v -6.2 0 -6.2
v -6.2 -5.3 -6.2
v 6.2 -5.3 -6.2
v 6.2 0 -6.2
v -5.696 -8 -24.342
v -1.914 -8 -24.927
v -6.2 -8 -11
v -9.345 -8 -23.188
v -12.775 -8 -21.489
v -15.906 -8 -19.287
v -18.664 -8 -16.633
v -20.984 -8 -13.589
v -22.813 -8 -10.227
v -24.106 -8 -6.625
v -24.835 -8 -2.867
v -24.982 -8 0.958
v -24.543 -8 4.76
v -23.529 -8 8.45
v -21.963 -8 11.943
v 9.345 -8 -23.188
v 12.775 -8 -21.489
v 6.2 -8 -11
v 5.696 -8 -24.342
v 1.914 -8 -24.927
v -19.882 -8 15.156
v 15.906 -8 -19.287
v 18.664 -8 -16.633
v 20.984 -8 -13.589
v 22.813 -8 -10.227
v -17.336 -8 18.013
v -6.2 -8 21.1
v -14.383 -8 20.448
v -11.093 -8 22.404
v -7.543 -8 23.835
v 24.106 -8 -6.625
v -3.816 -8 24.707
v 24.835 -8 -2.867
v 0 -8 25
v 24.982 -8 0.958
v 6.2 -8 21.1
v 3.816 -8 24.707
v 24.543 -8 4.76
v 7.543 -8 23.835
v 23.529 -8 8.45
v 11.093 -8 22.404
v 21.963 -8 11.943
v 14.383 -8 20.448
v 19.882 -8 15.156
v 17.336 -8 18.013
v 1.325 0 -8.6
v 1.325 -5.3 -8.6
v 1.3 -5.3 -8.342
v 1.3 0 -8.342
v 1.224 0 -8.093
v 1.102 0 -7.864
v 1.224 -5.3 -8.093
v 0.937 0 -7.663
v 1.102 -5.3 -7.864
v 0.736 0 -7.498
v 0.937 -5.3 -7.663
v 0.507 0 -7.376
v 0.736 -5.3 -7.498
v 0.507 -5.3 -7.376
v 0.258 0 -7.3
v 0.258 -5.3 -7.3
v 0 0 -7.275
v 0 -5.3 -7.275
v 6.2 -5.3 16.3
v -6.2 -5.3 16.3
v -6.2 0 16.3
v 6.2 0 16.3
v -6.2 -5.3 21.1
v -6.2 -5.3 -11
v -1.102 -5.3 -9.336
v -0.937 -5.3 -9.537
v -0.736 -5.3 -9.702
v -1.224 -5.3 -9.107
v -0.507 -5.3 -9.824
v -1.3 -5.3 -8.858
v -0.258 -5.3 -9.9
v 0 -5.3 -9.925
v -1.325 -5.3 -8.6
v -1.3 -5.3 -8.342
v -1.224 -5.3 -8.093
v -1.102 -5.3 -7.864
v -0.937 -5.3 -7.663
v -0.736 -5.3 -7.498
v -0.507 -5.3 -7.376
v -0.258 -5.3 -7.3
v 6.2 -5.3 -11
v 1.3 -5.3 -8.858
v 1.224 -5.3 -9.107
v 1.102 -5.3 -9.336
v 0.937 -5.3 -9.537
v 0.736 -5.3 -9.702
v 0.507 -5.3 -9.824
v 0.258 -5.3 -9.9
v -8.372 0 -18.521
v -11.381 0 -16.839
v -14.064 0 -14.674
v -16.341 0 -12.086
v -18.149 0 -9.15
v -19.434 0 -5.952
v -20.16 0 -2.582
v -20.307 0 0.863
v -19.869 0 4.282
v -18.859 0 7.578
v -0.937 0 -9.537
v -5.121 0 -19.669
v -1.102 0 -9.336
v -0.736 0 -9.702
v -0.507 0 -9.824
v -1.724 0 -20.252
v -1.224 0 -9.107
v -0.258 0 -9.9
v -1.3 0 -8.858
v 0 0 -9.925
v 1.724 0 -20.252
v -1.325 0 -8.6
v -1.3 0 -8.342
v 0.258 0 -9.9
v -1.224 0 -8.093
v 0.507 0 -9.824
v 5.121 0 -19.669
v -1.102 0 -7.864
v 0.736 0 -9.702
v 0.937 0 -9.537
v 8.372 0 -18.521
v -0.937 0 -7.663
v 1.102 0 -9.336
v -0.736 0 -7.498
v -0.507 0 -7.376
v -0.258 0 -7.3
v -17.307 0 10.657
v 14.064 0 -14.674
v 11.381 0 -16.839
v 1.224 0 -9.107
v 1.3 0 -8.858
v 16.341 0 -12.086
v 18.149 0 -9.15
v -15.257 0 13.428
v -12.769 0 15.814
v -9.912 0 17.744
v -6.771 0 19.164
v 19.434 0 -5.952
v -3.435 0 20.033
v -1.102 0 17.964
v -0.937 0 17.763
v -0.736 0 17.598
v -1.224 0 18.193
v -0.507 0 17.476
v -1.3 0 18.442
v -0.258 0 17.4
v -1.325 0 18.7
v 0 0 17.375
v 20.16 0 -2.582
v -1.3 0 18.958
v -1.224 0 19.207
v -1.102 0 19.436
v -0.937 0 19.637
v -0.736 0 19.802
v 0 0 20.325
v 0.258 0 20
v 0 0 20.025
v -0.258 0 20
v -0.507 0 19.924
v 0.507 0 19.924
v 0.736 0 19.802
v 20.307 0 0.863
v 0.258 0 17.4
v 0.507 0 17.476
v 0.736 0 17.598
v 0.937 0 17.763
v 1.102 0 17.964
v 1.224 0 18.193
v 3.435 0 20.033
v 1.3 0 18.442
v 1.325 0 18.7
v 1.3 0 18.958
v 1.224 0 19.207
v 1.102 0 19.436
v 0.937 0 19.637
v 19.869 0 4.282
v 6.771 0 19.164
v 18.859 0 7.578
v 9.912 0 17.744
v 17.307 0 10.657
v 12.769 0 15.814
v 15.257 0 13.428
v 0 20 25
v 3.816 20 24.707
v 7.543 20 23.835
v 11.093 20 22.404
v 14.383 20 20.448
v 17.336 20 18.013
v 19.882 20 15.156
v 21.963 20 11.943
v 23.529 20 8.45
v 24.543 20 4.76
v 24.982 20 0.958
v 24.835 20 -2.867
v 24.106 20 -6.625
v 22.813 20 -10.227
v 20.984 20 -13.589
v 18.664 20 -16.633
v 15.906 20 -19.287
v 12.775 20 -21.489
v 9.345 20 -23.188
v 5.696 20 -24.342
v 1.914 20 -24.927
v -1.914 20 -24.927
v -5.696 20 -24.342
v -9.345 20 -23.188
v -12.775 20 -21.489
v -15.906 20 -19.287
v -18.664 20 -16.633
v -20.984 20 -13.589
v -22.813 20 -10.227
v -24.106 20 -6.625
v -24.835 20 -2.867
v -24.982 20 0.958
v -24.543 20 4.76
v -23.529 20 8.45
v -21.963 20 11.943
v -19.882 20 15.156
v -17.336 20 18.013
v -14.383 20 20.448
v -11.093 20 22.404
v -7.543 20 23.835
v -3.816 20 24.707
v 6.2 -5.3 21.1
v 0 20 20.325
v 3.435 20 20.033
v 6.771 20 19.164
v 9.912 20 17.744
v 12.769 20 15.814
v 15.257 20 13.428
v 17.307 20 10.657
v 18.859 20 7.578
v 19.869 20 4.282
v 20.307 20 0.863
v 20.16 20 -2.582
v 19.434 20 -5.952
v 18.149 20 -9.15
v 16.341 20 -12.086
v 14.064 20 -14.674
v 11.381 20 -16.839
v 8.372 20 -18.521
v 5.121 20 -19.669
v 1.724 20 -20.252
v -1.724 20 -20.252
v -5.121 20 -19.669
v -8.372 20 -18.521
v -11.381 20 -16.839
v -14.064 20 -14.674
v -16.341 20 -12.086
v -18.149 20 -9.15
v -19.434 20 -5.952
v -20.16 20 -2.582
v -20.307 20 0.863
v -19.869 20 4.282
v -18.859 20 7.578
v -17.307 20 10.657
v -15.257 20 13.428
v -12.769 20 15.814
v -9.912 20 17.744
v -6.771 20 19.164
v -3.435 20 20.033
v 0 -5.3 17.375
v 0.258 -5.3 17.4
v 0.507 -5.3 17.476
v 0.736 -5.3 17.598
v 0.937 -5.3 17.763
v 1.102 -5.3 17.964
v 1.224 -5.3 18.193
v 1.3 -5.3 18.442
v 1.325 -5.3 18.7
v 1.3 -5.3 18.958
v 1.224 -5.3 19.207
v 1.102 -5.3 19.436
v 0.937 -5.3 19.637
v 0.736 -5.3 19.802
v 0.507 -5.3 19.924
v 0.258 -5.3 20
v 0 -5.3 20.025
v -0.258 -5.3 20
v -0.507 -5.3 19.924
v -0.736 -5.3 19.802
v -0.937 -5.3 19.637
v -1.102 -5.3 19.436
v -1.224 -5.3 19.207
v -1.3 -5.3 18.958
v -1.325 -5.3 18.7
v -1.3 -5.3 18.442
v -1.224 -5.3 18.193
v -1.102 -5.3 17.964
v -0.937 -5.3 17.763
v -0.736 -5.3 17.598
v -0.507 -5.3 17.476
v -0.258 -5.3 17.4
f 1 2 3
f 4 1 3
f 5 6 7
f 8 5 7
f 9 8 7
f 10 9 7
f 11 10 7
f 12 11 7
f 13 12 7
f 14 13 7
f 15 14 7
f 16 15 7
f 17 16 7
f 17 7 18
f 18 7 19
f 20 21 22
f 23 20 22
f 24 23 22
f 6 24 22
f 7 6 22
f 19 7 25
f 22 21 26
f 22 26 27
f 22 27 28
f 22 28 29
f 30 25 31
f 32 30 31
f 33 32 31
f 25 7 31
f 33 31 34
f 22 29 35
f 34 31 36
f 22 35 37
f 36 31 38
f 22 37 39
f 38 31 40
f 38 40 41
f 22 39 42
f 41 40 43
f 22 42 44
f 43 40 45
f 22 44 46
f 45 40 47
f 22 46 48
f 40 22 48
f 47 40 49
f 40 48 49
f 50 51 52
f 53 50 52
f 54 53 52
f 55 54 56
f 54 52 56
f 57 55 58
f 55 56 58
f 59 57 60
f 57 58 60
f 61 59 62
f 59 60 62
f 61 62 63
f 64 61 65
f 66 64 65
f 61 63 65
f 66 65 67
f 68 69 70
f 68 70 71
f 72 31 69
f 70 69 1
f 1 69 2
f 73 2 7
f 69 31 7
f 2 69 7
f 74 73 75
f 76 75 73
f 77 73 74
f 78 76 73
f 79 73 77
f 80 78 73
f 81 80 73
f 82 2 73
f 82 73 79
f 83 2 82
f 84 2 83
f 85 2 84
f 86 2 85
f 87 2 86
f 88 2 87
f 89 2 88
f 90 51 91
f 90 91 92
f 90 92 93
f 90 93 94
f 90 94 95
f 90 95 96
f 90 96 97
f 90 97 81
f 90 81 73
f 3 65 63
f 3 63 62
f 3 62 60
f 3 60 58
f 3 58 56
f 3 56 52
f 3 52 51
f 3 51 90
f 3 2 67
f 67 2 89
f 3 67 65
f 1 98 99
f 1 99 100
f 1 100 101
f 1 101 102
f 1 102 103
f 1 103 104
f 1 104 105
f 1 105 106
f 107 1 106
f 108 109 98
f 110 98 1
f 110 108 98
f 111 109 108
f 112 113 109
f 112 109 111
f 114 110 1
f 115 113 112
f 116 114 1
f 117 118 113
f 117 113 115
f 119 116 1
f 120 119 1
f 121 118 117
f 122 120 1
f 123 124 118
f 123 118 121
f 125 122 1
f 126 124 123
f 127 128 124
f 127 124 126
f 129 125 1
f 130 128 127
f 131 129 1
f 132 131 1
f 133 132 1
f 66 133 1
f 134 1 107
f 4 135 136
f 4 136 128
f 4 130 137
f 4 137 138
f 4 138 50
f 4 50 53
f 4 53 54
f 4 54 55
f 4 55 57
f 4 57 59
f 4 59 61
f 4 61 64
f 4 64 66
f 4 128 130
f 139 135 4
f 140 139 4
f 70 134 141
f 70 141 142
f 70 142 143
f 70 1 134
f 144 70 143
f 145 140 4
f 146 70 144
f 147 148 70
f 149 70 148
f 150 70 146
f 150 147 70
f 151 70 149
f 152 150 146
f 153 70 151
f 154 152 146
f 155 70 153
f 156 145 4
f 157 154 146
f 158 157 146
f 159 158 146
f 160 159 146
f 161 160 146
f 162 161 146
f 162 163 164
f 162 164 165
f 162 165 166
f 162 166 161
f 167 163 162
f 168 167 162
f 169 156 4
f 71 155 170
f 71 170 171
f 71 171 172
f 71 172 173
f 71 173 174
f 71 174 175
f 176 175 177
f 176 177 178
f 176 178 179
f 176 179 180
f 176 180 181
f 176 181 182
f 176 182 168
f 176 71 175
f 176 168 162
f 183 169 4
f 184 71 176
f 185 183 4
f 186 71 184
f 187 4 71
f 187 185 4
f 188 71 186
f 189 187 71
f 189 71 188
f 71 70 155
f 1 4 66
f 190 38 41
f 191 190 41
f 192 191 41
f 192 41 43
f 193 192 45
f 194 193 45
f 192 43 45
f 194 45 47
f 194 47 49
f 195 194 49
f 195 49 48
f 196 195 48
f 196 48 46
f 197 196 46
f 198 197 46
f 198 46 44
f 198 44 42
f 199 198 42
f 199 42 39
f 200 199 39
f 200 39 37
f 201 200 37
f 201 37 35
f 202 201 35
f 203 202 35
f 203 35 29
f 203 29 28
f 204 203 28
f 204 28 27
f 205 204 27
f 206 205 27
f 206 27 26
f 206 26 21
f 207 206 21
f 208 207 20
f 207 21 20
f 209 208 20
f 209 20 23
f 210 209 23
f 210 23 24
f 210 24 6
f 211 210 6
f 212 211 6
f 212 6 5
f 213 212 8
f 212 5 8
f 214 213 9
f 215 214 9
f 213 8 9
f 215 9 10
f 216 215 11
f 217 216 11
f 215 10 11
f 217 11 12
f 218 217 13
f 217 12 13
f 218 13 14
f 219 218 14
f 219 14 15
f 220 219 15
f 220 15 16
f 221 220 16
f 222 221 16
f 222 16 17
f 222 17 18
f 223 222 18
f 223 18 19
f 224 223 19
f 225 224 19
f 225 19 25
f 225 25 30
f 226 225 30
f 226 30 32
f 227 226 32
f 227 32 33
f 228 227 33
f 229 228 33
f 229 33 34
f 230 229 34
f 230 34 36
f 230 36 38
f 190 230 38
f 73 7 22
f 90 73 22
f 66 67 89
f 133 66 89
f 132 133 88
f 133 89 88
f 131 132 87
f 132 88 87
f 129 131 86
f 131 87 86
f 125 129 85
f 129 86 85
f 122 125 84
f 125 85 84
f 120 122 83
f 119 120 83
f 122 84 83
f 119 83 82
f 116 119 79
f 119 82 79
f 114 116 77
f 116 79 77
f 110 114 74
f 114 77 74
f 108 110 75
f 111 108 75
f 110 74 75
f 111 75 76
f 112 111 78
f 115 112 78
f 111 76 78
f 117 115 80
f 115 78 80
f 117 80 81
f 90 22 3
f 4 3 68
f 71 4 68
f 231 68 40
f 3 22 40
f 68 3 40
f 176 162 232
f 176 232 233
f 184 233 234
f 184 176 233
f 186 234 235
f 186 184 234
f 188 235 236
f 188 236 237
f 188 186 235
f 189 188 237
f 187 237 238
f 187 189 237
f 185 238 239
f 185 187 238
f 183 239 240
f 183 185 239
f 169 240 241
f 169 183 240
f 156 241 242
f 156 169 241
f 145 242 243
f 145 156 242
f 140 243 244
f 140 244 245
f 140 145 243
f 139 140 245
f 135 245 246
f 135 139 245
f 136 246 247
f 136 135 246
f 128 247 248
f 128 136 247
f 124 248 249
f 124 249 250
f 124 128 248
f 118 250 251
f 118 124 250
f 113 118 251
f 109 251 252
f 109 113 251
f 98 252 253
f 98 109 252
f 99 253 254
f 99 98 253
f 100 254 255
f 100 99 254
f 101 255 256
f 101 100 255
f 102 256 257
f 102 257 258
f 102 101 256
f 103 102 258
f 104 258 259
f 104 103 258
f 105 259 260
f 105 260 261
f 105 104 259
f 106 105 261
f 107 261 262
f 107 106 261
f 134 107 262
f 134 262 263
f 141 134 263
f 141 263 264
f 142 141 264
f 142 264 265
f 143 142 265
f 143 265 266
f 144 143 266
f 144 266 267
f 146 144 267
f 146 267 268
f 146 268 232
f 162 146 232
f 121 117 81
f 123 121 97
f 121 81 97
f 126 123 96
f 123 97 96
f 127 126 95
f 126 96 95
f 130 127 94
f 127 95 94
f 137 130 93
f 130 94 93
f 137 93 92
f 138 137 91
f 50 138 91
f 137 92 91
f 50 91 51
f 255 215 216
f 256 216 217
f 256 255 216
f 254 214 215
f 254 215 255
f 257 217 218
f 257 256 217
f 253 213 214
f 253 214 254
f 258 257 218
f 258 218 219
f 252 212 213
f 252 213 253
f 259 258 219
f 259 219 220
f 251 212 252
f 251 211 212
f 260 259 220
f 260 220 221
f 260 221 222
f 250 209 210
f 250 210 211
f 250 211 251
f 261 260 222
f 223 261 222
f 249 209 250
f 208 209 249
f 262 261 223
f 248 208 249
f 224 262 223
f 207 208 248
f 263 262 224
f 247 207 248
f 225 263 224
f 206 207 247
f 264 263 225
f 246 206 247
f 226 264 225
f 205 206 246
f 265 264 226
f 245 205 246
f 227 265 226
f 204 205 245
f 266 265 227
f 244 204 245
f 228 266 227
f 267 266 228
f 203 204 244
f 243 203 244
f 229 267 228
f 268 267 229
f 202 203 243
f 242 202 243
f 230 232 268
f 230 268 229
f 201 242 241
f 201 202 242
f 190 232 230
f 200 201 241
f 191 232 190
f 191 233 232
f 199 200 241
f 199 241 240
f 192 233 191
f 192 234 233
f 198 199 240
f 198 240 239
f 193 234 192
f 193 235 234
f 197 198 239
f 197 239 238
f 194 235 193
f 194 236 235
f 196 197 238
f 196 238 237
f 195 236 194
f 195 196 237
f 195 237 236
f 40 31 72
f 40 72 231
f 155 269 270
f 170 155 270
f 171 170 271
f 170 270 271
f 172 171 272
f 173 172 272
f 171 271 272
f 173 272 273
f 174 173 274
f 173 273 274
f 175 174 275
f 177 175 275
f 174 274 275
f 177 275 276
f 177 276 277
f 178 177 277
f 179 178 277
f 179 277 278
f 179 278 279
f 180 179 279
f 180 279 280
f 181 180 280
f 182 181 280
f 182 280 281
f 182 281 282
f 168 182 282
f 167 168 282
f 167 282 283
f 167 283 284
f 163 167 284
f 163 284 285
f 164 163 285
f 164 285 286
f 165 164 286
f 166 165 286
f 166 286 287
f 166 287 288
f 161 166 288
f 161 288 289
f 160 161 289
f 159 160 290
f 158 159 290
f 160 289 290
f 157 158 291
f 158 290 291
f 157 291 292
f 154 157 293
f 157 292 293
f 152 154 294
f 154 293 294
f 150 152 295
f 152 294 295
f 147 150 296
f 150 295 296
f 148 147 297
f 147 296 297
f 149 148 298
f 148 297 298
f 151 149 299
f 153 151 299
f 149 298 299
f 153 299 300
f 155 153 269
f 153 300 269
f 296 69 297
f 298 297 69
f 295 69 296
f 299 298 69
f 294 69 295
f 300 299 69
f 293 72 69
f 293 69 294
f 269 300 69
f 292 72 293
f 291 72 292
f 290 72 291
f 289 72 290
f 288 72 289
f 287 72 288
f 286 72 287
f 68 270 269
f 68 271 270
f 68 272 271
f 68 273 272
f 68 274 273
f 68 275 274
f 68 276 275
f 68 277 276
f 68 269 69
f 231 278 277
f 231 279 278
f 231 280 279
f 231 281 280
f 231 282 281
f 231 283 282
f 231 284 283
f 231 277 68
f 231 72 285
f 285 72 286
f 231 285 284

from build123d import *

# Parameters (mm, degrees)
SKETCH1_R           = 25
SKETCH1_R_2         = 20.325
BOSS_EXTRUDE1_DEPTH = 20
BOSS_EXTRUDE2_START = -8
SKETCH1_2_R         = 25
BOSS_EXTRUDE2_DEPTH = 8
SKETCH3_W           = 12.4
SKETCH3_H           = 4.8
SKETCH3_R           = 1.325
CUT_EXTRUDE1_DEPTH  = 2.7
SKETCH3_4_W         = 12.4
SKETCH3_4_H         = 22.5
CUT_EXTRUDE3_DEPTH  = 44.7
SKETCH3_5_R         = 1.325
CUT_EXTRUDE4_DEPTH  = 38.7


with BuildPart() as part:
    # Sketch1 → Boss-Extrude1 (new body)
    with BuildSketch(Plane(origin=(0, 0, 0), x_dir=(1, 0, 0), z_dir=(0, 1, 0))):
        Circle(SKETCH1_R)
        Circle(SKETCH1_R_2, mode=Mode.SUBTRACT)
    extrude(amount=BOSS_EXTRUDE1_DEPTH)

    # Sketch1<2> → Boss-Extrude2 (add)
    with BuildSketch(Plane(origin=(0, 0, 0), x_dir=(1, 0, 0), z_dir=(0, 1, 0)).offset(BOSS_EXTRUDE2_START)):
        Circle(SKETCH1_2_R)
    extrude(amount=BOSS_EXTRUDE2_DEPTH)

    # Sketch3 → Cut-Extrude1 (cut)
    # profile 1 of 2: a face of its own
    with BuildSketch(Plane.XZ.offset(8)):
        with Locations((0, -8.6)):
            Rectangle(SKETCH3_W, SKETCH3_H)
        with Locations((0, -8.6)):
            Circle(SKETCH3_R, mode=Mode.SUBTRACT)
    # profile 2 of 2: a face of its own
    with BuildSketch(Plane.XZ.offset(8)):
        with Locations((0, 18.7)):
            Rectangle(SKETCH3_W, SKETCH3_H)
        with Locations((0, 18.7)):
            Circle(SKETCH3_R, mode=Mode.SUBTRACT)
    extrude(amount=-CUT_EXTRUDE1_DEPTH, mode=Mode.SUBTRACT)

    # Sketch3<4> → Cut-Extrude3 (cut)
    with BuildSketch(Plane.XZ.offset(8)):
        with Locations((0, 5.05)):
            Rectangle(SKETCH3_4_W, SKETCH3_4_H)
    extrude(amount=-CUT_EXTRUDE3_DEPTH, mode=Mode.SUBTRACT)

    # Sketch3<5> → Cut-Extrude4 (cut)
    with BuildSketch(Plane.XZ.offset(8)):
        with Locations((0, -8.6)):
            Circle(SKETCH3_5_R)
        with Locations((0, 18.7)):
            Circle(SKETCH3_5_R)
    extrude(amount=-CUT_EXTRUDE4_DEPTH, mode=Mode.SUBTRACT)


solid = part.part
